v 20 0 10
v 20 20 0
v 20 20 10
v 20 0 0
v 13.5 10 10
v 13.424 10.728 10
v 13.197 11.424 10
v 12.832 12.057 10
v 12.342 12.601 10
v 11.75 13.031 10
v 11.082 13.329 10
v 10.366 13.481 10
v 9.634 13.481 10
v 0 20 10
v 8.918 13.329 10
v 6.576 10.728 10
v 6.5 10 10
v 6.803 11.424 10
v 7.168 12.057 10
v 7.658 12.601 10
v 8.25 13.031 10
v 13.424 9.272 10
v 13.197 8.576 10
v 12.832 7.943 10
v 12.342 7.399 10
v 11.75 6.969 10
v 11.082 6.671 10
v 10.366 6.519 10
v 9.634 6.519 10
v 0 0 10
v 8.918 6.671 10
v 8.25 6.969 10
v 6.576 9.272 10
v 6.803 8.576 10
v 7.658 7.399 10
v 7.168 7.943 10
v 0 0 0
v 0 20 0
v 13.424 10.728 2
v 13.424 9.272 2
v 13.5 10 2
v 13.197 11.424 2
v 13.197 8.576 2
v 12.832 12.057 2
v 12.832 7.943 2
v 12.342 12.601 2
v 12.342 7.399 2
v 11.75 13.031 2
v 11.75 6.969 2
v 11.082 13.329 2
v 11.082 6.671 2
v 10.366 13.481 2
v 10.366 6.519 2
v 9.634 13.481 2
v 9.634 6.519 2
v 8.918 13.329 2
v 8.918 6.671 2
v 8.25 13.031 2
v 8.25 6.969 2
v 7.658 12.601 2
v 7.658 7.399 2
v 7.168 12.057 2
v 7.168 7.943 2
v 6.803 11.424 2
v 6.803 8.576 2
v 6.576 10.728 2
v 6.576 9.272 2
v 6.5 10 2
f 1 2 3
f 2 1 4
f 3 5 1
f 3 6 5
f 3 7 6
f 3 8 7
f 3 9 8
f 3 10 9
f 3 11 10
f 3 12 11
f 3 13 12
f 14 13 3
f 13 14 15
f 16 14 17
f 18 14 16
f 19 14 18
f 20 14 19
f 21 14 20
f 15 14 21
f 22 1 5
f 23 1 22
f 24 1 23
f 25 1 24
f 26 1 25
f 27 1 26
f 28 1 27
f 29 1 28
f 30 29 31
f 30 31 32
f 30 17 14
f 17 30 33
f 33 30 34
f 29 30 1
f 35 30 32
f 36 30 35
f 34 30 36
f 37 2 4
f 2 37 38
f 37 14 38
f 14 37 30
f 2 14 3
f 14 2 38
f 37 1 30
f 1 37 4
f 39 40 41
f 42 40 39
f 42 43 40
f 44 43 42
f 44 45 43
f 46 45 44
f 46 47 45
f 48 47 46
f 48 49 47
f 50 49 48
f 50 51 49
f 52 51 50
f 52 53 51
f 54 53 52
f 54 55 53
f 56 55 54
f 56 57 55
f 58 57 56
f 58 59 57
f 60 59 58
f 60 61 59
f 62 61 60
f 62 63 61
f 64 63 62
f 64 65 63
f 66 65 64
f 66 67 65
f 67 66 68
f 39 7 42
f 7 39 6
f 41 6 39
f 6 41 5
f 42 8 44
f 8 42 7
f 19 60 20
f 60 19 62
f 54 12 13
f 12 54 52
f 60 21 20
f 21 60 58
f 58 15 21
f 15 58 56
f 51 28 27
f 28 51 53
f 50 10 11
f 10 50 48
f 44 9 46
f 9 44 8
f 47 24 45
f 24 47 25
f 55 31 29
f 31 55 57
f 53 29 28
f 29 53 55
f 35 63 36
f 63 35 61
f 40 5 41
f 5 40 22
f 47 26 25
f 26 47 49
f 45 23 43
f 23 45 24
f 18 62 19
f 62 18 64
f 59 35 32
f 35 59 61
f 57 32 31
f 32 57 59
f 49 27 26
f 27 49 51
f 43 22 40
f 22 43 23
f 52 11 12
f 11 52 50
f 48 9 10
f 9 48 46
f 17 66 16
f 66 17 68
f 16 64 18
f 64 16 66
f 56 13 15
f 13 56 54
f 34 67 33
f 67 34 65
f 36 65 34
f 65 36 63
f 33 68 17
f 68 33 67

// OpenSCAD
// Minimum fragment size (smooths the screw holes)
$fs = 0.15;

// cube with hole for insert
hole_radius = 3.5;

difference() {
    cube([20, 20, 10]);
    translate([10, 10, 2])
        cylinder(h=10.01, r=hole_radius);
}
